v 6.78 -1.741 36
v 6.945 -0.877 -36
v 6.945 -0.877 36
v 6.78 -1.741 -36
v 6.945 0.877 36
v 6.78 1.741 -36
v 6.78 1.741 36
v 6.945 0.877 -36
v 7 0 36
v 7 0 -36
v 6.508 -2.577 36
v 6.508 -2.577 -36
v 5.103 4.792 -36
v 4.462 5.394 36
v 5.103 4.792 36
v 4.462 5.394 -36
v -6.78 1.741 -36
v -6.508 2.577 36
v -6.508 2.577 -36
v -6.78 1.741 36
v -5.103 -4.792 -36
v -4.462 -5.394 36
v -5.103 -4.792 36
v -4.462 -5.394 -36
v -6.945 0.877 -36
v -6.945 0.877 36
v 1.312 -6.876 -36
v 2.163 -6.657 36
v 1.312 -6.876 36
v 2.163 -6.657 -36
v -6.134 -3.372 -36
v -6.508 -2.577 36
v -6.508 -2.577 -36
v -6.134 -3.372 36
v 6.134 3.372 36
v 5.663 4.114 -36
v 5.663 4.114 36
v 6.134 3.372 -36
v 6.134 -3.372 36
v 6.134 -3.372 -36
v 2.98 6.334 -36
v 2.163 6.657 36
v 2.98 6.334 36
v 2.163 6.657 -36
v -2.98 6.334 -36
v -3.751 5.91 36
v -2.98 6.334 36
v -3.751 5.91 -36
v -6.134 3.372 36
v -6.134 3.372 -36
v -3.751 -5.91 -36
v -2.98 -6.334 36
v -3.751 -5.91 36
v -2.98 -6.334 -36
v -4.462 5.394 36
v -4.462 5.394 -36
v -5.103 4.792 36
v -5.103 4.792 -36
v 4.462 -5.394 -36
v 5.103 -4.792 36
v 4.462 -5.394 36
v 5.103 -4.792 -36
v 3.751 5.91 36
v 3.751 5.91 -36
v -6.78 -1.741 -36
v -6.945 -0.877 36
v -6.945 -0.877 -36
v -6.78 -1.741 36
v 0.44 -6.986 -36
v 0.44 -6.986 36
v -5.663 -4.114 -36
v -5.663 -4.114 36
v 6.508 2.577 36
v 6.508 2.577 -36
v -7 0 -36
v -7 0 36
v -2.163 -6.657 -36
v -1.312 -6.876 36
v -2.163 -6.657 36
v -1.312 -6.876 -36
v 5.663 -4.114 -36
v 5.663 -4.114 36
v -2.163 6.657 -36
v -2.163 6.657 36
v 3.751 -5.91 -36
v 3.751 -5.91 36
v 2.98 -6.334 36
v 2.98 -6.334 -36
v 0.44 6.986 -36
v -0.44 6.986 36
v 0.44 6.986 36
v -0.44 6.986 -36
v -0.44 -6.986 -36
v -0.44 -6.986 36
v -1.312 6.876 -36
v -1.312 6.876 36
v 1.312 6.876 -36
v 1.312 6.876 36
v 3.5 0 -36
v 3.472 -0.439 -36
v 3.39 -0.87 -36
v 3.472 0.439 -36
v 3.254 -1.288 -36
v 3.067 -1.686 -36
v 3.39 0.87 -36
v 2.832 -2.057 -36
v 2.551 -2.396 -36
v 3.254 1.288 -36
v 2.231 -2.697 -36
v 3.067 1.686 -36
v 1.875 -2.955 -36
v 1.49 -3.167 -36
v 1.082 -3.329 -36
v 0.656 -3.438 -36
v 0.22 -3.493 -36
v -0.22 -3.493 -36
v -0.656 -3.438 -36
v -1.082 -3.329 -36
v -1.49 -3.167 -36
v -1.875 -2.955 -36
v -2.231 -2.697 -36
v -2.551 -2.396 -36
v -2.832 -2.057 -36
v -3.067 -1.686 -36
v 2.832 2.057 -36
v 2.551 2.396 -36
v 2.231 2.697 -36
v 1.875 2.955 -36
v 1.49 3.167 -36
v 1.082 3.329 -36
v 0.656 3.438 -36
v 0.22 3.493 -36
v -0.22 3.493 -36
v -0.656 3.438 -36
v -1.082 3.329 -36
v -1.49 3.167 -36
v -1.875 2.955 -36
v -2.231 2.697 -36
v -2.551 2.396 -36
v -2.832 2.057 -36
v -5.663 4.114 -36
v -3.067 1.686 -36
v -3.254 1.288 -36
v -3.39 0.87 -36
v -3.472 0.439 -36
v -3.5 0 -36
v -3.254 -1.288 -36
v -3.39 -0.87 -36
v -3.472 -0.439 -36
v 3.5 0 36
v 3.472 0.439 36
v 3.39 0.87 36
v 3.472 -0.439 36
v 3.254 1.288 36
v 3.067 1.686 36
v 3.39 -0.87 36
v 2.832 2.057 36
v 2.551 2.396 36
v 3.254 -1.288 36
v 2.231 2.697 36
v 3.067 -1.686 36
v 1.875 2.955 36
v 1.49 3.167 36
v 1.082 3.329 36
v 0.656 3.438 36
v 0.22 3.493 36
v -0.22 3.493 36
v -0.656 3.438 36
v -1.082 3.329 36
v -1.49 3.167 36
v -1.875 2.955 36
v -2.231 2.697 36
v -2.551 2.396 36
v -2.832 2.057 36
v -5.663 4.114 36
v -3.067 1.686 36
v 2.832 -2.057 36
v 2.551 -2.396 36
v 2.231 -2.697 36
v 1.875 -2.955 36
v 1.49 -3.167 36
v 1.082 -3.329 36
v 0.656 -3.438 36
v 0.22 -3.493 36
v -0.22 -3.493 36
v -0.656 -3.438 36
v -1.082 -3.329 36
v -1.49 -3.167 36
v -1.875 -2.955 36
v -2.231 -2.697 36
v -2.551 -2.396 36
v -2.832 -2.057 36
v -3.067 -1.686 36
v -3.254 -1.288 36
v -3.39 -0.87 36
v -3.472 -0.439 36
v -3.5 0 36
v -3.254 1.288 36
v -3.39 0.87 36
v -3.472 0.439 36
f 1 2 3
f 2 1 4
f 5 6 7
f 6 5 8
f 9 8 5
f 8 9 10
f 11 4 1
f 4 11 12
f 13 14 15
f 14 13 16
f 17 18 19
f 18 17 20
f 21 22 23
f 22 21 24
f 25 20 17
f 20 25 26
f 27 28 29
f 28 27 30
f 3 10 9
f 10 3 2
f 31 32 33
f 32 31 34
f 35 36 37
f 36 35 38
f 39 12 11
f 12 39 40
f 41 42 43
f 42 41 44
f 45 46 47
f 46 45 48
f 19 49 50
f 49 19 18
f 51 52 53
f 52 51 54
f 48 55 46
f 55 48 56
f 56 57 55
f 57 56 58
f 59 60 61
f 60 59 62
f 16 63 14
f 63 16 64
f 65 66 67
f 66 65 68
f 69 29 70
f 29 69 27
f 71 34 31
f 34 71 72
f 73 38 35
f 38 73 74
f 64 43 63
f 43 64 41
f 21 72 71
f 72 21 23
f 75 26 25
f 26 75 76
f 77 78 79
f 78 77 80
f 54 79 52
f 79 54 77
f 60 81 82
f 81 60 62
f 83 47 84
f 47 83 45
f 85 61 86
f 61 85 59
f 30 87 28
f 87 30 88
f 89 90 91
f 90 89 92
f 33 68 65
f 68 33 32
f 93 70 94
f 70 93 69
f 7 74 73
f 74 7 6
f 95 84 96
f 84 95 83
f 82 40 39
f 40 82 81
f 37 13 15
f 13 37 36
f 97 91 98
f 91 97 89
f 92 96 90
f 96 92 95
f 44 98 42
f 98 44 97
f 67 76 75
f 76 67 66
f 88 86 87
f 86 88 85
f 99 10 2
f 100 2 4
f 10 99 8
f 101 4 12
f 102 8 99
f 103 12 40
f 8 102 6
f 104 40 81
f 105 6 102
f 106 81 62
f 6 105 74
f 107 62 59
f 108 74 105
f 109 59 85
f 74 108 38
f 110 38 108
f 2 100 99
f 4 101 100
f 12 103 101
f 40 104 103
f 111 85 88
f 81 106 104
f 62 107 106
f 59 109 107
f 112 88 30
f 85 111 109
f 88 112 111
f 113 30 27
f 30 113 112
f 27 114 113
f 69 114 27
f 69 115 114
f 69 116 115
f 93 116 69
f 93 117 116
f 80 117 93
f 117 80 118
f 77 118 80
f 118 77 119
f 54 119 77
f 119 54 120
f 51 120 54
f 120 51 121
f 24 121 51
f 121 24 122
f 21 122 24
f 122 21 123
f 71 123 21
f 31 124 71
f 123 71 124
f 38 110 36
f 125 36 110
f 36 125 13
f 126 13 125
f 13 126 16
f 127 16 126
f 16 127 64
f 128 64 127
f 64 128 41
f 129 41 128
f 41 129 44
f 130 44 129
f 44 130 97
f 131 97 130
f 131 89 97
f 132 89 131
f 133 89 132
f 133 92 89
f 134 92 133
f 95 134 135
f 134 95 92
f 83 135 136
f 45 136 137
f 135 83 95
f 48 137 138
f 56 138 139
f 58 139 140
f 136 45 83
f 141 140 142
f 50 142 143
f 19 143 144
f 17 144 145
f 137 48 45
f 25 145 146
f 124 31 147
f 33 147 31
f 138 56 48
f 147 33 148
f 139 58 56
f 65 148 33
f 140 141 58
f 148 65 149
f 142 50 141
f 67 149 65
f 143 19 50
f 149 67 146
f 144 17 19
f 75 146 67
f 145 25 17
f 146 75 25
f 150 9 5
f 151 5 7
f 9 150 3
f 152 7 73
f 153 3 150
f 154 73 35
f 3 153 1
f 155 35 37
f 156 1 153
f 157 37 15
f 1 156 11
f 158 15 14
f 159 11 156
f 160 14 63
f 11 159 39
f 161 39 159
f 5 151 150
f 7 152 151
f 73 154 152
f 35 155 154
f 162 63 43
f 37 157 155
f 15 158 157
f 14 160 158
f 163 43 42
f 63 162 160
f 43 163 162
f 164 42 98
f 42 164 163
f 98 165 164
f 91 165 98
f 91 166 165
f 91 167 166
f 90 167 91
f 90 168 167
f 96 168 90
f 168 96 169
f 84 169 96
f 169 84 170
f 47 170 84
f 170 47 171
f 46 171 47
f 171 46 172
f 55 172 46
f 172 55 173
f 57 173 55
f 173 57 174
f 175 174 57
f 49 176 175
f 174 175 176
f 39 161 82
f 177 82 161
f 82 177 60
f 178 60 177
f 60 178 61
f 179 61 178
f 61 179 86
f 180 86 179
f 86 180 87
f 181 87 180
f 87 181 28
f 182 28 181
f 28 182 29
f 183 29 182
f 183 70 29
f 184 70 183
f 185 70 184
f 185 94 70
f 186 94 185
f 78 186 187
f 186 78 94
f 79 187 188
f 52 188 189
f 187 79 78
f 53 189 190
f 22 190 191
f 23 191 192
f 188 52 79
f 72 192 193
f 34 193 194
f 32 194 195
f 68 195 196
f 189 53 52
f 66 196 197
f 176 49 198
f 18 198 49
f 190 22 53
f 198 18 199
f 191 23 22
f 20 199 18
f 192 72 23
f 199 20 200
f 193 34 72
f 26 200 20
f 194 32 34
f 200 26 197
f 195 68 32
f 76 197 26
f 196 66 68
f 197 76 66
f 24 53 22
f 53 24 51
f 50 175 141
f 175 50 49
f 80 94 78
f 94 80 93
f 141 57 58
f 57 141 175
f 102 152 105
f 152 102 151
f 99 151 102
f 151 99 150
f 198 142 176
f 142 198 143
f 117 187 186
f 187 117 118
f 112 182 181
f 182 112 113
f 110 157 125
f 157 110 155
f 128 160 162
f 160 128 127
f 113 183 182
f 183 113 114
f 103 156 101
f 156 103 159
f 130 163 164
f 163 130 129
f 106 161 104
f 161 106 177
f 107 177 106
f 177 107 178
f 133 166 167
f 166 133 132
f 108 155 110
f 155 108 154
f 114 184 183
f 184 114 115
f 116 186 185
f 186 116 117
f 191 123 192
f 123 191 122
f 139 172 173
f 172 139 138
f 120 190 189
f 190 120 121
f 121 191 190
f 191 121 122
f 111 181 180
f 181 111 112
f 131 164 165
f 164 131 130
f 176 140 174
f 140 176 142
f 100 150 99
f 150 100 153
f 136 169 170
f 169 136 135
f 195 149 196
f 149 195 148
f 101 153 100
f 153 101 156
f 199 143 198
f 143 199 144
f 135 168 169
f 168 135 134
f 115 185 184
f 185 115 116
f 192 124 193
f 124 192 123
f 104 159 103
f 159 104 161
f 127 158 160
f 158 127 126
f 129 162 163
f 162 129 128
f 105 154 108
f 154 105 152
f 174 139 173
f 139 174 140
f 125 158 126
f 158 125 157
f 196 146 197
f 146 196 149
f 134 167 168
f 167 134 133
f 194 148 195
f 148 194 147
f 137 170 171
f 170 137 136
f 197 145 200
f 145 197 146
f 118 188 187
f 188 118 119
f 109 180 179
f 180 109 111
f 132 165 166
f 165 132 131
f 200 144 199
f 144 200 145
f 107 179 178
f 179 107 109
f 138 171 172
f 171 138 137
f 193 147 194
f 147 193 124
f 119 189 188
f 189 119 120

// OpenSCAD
$fn = 50;


difference() {
	union() {
		translate(v = [0, 0, -36.0000000000]) {
			cylinder(h = 72, r = 7.0000000000);
		}
	}
	union() {
		translate(v = [0, 0, -100.0000000000]) {
			cylinder(h = 200, r = 3.5000000000);
		}
	}
}
